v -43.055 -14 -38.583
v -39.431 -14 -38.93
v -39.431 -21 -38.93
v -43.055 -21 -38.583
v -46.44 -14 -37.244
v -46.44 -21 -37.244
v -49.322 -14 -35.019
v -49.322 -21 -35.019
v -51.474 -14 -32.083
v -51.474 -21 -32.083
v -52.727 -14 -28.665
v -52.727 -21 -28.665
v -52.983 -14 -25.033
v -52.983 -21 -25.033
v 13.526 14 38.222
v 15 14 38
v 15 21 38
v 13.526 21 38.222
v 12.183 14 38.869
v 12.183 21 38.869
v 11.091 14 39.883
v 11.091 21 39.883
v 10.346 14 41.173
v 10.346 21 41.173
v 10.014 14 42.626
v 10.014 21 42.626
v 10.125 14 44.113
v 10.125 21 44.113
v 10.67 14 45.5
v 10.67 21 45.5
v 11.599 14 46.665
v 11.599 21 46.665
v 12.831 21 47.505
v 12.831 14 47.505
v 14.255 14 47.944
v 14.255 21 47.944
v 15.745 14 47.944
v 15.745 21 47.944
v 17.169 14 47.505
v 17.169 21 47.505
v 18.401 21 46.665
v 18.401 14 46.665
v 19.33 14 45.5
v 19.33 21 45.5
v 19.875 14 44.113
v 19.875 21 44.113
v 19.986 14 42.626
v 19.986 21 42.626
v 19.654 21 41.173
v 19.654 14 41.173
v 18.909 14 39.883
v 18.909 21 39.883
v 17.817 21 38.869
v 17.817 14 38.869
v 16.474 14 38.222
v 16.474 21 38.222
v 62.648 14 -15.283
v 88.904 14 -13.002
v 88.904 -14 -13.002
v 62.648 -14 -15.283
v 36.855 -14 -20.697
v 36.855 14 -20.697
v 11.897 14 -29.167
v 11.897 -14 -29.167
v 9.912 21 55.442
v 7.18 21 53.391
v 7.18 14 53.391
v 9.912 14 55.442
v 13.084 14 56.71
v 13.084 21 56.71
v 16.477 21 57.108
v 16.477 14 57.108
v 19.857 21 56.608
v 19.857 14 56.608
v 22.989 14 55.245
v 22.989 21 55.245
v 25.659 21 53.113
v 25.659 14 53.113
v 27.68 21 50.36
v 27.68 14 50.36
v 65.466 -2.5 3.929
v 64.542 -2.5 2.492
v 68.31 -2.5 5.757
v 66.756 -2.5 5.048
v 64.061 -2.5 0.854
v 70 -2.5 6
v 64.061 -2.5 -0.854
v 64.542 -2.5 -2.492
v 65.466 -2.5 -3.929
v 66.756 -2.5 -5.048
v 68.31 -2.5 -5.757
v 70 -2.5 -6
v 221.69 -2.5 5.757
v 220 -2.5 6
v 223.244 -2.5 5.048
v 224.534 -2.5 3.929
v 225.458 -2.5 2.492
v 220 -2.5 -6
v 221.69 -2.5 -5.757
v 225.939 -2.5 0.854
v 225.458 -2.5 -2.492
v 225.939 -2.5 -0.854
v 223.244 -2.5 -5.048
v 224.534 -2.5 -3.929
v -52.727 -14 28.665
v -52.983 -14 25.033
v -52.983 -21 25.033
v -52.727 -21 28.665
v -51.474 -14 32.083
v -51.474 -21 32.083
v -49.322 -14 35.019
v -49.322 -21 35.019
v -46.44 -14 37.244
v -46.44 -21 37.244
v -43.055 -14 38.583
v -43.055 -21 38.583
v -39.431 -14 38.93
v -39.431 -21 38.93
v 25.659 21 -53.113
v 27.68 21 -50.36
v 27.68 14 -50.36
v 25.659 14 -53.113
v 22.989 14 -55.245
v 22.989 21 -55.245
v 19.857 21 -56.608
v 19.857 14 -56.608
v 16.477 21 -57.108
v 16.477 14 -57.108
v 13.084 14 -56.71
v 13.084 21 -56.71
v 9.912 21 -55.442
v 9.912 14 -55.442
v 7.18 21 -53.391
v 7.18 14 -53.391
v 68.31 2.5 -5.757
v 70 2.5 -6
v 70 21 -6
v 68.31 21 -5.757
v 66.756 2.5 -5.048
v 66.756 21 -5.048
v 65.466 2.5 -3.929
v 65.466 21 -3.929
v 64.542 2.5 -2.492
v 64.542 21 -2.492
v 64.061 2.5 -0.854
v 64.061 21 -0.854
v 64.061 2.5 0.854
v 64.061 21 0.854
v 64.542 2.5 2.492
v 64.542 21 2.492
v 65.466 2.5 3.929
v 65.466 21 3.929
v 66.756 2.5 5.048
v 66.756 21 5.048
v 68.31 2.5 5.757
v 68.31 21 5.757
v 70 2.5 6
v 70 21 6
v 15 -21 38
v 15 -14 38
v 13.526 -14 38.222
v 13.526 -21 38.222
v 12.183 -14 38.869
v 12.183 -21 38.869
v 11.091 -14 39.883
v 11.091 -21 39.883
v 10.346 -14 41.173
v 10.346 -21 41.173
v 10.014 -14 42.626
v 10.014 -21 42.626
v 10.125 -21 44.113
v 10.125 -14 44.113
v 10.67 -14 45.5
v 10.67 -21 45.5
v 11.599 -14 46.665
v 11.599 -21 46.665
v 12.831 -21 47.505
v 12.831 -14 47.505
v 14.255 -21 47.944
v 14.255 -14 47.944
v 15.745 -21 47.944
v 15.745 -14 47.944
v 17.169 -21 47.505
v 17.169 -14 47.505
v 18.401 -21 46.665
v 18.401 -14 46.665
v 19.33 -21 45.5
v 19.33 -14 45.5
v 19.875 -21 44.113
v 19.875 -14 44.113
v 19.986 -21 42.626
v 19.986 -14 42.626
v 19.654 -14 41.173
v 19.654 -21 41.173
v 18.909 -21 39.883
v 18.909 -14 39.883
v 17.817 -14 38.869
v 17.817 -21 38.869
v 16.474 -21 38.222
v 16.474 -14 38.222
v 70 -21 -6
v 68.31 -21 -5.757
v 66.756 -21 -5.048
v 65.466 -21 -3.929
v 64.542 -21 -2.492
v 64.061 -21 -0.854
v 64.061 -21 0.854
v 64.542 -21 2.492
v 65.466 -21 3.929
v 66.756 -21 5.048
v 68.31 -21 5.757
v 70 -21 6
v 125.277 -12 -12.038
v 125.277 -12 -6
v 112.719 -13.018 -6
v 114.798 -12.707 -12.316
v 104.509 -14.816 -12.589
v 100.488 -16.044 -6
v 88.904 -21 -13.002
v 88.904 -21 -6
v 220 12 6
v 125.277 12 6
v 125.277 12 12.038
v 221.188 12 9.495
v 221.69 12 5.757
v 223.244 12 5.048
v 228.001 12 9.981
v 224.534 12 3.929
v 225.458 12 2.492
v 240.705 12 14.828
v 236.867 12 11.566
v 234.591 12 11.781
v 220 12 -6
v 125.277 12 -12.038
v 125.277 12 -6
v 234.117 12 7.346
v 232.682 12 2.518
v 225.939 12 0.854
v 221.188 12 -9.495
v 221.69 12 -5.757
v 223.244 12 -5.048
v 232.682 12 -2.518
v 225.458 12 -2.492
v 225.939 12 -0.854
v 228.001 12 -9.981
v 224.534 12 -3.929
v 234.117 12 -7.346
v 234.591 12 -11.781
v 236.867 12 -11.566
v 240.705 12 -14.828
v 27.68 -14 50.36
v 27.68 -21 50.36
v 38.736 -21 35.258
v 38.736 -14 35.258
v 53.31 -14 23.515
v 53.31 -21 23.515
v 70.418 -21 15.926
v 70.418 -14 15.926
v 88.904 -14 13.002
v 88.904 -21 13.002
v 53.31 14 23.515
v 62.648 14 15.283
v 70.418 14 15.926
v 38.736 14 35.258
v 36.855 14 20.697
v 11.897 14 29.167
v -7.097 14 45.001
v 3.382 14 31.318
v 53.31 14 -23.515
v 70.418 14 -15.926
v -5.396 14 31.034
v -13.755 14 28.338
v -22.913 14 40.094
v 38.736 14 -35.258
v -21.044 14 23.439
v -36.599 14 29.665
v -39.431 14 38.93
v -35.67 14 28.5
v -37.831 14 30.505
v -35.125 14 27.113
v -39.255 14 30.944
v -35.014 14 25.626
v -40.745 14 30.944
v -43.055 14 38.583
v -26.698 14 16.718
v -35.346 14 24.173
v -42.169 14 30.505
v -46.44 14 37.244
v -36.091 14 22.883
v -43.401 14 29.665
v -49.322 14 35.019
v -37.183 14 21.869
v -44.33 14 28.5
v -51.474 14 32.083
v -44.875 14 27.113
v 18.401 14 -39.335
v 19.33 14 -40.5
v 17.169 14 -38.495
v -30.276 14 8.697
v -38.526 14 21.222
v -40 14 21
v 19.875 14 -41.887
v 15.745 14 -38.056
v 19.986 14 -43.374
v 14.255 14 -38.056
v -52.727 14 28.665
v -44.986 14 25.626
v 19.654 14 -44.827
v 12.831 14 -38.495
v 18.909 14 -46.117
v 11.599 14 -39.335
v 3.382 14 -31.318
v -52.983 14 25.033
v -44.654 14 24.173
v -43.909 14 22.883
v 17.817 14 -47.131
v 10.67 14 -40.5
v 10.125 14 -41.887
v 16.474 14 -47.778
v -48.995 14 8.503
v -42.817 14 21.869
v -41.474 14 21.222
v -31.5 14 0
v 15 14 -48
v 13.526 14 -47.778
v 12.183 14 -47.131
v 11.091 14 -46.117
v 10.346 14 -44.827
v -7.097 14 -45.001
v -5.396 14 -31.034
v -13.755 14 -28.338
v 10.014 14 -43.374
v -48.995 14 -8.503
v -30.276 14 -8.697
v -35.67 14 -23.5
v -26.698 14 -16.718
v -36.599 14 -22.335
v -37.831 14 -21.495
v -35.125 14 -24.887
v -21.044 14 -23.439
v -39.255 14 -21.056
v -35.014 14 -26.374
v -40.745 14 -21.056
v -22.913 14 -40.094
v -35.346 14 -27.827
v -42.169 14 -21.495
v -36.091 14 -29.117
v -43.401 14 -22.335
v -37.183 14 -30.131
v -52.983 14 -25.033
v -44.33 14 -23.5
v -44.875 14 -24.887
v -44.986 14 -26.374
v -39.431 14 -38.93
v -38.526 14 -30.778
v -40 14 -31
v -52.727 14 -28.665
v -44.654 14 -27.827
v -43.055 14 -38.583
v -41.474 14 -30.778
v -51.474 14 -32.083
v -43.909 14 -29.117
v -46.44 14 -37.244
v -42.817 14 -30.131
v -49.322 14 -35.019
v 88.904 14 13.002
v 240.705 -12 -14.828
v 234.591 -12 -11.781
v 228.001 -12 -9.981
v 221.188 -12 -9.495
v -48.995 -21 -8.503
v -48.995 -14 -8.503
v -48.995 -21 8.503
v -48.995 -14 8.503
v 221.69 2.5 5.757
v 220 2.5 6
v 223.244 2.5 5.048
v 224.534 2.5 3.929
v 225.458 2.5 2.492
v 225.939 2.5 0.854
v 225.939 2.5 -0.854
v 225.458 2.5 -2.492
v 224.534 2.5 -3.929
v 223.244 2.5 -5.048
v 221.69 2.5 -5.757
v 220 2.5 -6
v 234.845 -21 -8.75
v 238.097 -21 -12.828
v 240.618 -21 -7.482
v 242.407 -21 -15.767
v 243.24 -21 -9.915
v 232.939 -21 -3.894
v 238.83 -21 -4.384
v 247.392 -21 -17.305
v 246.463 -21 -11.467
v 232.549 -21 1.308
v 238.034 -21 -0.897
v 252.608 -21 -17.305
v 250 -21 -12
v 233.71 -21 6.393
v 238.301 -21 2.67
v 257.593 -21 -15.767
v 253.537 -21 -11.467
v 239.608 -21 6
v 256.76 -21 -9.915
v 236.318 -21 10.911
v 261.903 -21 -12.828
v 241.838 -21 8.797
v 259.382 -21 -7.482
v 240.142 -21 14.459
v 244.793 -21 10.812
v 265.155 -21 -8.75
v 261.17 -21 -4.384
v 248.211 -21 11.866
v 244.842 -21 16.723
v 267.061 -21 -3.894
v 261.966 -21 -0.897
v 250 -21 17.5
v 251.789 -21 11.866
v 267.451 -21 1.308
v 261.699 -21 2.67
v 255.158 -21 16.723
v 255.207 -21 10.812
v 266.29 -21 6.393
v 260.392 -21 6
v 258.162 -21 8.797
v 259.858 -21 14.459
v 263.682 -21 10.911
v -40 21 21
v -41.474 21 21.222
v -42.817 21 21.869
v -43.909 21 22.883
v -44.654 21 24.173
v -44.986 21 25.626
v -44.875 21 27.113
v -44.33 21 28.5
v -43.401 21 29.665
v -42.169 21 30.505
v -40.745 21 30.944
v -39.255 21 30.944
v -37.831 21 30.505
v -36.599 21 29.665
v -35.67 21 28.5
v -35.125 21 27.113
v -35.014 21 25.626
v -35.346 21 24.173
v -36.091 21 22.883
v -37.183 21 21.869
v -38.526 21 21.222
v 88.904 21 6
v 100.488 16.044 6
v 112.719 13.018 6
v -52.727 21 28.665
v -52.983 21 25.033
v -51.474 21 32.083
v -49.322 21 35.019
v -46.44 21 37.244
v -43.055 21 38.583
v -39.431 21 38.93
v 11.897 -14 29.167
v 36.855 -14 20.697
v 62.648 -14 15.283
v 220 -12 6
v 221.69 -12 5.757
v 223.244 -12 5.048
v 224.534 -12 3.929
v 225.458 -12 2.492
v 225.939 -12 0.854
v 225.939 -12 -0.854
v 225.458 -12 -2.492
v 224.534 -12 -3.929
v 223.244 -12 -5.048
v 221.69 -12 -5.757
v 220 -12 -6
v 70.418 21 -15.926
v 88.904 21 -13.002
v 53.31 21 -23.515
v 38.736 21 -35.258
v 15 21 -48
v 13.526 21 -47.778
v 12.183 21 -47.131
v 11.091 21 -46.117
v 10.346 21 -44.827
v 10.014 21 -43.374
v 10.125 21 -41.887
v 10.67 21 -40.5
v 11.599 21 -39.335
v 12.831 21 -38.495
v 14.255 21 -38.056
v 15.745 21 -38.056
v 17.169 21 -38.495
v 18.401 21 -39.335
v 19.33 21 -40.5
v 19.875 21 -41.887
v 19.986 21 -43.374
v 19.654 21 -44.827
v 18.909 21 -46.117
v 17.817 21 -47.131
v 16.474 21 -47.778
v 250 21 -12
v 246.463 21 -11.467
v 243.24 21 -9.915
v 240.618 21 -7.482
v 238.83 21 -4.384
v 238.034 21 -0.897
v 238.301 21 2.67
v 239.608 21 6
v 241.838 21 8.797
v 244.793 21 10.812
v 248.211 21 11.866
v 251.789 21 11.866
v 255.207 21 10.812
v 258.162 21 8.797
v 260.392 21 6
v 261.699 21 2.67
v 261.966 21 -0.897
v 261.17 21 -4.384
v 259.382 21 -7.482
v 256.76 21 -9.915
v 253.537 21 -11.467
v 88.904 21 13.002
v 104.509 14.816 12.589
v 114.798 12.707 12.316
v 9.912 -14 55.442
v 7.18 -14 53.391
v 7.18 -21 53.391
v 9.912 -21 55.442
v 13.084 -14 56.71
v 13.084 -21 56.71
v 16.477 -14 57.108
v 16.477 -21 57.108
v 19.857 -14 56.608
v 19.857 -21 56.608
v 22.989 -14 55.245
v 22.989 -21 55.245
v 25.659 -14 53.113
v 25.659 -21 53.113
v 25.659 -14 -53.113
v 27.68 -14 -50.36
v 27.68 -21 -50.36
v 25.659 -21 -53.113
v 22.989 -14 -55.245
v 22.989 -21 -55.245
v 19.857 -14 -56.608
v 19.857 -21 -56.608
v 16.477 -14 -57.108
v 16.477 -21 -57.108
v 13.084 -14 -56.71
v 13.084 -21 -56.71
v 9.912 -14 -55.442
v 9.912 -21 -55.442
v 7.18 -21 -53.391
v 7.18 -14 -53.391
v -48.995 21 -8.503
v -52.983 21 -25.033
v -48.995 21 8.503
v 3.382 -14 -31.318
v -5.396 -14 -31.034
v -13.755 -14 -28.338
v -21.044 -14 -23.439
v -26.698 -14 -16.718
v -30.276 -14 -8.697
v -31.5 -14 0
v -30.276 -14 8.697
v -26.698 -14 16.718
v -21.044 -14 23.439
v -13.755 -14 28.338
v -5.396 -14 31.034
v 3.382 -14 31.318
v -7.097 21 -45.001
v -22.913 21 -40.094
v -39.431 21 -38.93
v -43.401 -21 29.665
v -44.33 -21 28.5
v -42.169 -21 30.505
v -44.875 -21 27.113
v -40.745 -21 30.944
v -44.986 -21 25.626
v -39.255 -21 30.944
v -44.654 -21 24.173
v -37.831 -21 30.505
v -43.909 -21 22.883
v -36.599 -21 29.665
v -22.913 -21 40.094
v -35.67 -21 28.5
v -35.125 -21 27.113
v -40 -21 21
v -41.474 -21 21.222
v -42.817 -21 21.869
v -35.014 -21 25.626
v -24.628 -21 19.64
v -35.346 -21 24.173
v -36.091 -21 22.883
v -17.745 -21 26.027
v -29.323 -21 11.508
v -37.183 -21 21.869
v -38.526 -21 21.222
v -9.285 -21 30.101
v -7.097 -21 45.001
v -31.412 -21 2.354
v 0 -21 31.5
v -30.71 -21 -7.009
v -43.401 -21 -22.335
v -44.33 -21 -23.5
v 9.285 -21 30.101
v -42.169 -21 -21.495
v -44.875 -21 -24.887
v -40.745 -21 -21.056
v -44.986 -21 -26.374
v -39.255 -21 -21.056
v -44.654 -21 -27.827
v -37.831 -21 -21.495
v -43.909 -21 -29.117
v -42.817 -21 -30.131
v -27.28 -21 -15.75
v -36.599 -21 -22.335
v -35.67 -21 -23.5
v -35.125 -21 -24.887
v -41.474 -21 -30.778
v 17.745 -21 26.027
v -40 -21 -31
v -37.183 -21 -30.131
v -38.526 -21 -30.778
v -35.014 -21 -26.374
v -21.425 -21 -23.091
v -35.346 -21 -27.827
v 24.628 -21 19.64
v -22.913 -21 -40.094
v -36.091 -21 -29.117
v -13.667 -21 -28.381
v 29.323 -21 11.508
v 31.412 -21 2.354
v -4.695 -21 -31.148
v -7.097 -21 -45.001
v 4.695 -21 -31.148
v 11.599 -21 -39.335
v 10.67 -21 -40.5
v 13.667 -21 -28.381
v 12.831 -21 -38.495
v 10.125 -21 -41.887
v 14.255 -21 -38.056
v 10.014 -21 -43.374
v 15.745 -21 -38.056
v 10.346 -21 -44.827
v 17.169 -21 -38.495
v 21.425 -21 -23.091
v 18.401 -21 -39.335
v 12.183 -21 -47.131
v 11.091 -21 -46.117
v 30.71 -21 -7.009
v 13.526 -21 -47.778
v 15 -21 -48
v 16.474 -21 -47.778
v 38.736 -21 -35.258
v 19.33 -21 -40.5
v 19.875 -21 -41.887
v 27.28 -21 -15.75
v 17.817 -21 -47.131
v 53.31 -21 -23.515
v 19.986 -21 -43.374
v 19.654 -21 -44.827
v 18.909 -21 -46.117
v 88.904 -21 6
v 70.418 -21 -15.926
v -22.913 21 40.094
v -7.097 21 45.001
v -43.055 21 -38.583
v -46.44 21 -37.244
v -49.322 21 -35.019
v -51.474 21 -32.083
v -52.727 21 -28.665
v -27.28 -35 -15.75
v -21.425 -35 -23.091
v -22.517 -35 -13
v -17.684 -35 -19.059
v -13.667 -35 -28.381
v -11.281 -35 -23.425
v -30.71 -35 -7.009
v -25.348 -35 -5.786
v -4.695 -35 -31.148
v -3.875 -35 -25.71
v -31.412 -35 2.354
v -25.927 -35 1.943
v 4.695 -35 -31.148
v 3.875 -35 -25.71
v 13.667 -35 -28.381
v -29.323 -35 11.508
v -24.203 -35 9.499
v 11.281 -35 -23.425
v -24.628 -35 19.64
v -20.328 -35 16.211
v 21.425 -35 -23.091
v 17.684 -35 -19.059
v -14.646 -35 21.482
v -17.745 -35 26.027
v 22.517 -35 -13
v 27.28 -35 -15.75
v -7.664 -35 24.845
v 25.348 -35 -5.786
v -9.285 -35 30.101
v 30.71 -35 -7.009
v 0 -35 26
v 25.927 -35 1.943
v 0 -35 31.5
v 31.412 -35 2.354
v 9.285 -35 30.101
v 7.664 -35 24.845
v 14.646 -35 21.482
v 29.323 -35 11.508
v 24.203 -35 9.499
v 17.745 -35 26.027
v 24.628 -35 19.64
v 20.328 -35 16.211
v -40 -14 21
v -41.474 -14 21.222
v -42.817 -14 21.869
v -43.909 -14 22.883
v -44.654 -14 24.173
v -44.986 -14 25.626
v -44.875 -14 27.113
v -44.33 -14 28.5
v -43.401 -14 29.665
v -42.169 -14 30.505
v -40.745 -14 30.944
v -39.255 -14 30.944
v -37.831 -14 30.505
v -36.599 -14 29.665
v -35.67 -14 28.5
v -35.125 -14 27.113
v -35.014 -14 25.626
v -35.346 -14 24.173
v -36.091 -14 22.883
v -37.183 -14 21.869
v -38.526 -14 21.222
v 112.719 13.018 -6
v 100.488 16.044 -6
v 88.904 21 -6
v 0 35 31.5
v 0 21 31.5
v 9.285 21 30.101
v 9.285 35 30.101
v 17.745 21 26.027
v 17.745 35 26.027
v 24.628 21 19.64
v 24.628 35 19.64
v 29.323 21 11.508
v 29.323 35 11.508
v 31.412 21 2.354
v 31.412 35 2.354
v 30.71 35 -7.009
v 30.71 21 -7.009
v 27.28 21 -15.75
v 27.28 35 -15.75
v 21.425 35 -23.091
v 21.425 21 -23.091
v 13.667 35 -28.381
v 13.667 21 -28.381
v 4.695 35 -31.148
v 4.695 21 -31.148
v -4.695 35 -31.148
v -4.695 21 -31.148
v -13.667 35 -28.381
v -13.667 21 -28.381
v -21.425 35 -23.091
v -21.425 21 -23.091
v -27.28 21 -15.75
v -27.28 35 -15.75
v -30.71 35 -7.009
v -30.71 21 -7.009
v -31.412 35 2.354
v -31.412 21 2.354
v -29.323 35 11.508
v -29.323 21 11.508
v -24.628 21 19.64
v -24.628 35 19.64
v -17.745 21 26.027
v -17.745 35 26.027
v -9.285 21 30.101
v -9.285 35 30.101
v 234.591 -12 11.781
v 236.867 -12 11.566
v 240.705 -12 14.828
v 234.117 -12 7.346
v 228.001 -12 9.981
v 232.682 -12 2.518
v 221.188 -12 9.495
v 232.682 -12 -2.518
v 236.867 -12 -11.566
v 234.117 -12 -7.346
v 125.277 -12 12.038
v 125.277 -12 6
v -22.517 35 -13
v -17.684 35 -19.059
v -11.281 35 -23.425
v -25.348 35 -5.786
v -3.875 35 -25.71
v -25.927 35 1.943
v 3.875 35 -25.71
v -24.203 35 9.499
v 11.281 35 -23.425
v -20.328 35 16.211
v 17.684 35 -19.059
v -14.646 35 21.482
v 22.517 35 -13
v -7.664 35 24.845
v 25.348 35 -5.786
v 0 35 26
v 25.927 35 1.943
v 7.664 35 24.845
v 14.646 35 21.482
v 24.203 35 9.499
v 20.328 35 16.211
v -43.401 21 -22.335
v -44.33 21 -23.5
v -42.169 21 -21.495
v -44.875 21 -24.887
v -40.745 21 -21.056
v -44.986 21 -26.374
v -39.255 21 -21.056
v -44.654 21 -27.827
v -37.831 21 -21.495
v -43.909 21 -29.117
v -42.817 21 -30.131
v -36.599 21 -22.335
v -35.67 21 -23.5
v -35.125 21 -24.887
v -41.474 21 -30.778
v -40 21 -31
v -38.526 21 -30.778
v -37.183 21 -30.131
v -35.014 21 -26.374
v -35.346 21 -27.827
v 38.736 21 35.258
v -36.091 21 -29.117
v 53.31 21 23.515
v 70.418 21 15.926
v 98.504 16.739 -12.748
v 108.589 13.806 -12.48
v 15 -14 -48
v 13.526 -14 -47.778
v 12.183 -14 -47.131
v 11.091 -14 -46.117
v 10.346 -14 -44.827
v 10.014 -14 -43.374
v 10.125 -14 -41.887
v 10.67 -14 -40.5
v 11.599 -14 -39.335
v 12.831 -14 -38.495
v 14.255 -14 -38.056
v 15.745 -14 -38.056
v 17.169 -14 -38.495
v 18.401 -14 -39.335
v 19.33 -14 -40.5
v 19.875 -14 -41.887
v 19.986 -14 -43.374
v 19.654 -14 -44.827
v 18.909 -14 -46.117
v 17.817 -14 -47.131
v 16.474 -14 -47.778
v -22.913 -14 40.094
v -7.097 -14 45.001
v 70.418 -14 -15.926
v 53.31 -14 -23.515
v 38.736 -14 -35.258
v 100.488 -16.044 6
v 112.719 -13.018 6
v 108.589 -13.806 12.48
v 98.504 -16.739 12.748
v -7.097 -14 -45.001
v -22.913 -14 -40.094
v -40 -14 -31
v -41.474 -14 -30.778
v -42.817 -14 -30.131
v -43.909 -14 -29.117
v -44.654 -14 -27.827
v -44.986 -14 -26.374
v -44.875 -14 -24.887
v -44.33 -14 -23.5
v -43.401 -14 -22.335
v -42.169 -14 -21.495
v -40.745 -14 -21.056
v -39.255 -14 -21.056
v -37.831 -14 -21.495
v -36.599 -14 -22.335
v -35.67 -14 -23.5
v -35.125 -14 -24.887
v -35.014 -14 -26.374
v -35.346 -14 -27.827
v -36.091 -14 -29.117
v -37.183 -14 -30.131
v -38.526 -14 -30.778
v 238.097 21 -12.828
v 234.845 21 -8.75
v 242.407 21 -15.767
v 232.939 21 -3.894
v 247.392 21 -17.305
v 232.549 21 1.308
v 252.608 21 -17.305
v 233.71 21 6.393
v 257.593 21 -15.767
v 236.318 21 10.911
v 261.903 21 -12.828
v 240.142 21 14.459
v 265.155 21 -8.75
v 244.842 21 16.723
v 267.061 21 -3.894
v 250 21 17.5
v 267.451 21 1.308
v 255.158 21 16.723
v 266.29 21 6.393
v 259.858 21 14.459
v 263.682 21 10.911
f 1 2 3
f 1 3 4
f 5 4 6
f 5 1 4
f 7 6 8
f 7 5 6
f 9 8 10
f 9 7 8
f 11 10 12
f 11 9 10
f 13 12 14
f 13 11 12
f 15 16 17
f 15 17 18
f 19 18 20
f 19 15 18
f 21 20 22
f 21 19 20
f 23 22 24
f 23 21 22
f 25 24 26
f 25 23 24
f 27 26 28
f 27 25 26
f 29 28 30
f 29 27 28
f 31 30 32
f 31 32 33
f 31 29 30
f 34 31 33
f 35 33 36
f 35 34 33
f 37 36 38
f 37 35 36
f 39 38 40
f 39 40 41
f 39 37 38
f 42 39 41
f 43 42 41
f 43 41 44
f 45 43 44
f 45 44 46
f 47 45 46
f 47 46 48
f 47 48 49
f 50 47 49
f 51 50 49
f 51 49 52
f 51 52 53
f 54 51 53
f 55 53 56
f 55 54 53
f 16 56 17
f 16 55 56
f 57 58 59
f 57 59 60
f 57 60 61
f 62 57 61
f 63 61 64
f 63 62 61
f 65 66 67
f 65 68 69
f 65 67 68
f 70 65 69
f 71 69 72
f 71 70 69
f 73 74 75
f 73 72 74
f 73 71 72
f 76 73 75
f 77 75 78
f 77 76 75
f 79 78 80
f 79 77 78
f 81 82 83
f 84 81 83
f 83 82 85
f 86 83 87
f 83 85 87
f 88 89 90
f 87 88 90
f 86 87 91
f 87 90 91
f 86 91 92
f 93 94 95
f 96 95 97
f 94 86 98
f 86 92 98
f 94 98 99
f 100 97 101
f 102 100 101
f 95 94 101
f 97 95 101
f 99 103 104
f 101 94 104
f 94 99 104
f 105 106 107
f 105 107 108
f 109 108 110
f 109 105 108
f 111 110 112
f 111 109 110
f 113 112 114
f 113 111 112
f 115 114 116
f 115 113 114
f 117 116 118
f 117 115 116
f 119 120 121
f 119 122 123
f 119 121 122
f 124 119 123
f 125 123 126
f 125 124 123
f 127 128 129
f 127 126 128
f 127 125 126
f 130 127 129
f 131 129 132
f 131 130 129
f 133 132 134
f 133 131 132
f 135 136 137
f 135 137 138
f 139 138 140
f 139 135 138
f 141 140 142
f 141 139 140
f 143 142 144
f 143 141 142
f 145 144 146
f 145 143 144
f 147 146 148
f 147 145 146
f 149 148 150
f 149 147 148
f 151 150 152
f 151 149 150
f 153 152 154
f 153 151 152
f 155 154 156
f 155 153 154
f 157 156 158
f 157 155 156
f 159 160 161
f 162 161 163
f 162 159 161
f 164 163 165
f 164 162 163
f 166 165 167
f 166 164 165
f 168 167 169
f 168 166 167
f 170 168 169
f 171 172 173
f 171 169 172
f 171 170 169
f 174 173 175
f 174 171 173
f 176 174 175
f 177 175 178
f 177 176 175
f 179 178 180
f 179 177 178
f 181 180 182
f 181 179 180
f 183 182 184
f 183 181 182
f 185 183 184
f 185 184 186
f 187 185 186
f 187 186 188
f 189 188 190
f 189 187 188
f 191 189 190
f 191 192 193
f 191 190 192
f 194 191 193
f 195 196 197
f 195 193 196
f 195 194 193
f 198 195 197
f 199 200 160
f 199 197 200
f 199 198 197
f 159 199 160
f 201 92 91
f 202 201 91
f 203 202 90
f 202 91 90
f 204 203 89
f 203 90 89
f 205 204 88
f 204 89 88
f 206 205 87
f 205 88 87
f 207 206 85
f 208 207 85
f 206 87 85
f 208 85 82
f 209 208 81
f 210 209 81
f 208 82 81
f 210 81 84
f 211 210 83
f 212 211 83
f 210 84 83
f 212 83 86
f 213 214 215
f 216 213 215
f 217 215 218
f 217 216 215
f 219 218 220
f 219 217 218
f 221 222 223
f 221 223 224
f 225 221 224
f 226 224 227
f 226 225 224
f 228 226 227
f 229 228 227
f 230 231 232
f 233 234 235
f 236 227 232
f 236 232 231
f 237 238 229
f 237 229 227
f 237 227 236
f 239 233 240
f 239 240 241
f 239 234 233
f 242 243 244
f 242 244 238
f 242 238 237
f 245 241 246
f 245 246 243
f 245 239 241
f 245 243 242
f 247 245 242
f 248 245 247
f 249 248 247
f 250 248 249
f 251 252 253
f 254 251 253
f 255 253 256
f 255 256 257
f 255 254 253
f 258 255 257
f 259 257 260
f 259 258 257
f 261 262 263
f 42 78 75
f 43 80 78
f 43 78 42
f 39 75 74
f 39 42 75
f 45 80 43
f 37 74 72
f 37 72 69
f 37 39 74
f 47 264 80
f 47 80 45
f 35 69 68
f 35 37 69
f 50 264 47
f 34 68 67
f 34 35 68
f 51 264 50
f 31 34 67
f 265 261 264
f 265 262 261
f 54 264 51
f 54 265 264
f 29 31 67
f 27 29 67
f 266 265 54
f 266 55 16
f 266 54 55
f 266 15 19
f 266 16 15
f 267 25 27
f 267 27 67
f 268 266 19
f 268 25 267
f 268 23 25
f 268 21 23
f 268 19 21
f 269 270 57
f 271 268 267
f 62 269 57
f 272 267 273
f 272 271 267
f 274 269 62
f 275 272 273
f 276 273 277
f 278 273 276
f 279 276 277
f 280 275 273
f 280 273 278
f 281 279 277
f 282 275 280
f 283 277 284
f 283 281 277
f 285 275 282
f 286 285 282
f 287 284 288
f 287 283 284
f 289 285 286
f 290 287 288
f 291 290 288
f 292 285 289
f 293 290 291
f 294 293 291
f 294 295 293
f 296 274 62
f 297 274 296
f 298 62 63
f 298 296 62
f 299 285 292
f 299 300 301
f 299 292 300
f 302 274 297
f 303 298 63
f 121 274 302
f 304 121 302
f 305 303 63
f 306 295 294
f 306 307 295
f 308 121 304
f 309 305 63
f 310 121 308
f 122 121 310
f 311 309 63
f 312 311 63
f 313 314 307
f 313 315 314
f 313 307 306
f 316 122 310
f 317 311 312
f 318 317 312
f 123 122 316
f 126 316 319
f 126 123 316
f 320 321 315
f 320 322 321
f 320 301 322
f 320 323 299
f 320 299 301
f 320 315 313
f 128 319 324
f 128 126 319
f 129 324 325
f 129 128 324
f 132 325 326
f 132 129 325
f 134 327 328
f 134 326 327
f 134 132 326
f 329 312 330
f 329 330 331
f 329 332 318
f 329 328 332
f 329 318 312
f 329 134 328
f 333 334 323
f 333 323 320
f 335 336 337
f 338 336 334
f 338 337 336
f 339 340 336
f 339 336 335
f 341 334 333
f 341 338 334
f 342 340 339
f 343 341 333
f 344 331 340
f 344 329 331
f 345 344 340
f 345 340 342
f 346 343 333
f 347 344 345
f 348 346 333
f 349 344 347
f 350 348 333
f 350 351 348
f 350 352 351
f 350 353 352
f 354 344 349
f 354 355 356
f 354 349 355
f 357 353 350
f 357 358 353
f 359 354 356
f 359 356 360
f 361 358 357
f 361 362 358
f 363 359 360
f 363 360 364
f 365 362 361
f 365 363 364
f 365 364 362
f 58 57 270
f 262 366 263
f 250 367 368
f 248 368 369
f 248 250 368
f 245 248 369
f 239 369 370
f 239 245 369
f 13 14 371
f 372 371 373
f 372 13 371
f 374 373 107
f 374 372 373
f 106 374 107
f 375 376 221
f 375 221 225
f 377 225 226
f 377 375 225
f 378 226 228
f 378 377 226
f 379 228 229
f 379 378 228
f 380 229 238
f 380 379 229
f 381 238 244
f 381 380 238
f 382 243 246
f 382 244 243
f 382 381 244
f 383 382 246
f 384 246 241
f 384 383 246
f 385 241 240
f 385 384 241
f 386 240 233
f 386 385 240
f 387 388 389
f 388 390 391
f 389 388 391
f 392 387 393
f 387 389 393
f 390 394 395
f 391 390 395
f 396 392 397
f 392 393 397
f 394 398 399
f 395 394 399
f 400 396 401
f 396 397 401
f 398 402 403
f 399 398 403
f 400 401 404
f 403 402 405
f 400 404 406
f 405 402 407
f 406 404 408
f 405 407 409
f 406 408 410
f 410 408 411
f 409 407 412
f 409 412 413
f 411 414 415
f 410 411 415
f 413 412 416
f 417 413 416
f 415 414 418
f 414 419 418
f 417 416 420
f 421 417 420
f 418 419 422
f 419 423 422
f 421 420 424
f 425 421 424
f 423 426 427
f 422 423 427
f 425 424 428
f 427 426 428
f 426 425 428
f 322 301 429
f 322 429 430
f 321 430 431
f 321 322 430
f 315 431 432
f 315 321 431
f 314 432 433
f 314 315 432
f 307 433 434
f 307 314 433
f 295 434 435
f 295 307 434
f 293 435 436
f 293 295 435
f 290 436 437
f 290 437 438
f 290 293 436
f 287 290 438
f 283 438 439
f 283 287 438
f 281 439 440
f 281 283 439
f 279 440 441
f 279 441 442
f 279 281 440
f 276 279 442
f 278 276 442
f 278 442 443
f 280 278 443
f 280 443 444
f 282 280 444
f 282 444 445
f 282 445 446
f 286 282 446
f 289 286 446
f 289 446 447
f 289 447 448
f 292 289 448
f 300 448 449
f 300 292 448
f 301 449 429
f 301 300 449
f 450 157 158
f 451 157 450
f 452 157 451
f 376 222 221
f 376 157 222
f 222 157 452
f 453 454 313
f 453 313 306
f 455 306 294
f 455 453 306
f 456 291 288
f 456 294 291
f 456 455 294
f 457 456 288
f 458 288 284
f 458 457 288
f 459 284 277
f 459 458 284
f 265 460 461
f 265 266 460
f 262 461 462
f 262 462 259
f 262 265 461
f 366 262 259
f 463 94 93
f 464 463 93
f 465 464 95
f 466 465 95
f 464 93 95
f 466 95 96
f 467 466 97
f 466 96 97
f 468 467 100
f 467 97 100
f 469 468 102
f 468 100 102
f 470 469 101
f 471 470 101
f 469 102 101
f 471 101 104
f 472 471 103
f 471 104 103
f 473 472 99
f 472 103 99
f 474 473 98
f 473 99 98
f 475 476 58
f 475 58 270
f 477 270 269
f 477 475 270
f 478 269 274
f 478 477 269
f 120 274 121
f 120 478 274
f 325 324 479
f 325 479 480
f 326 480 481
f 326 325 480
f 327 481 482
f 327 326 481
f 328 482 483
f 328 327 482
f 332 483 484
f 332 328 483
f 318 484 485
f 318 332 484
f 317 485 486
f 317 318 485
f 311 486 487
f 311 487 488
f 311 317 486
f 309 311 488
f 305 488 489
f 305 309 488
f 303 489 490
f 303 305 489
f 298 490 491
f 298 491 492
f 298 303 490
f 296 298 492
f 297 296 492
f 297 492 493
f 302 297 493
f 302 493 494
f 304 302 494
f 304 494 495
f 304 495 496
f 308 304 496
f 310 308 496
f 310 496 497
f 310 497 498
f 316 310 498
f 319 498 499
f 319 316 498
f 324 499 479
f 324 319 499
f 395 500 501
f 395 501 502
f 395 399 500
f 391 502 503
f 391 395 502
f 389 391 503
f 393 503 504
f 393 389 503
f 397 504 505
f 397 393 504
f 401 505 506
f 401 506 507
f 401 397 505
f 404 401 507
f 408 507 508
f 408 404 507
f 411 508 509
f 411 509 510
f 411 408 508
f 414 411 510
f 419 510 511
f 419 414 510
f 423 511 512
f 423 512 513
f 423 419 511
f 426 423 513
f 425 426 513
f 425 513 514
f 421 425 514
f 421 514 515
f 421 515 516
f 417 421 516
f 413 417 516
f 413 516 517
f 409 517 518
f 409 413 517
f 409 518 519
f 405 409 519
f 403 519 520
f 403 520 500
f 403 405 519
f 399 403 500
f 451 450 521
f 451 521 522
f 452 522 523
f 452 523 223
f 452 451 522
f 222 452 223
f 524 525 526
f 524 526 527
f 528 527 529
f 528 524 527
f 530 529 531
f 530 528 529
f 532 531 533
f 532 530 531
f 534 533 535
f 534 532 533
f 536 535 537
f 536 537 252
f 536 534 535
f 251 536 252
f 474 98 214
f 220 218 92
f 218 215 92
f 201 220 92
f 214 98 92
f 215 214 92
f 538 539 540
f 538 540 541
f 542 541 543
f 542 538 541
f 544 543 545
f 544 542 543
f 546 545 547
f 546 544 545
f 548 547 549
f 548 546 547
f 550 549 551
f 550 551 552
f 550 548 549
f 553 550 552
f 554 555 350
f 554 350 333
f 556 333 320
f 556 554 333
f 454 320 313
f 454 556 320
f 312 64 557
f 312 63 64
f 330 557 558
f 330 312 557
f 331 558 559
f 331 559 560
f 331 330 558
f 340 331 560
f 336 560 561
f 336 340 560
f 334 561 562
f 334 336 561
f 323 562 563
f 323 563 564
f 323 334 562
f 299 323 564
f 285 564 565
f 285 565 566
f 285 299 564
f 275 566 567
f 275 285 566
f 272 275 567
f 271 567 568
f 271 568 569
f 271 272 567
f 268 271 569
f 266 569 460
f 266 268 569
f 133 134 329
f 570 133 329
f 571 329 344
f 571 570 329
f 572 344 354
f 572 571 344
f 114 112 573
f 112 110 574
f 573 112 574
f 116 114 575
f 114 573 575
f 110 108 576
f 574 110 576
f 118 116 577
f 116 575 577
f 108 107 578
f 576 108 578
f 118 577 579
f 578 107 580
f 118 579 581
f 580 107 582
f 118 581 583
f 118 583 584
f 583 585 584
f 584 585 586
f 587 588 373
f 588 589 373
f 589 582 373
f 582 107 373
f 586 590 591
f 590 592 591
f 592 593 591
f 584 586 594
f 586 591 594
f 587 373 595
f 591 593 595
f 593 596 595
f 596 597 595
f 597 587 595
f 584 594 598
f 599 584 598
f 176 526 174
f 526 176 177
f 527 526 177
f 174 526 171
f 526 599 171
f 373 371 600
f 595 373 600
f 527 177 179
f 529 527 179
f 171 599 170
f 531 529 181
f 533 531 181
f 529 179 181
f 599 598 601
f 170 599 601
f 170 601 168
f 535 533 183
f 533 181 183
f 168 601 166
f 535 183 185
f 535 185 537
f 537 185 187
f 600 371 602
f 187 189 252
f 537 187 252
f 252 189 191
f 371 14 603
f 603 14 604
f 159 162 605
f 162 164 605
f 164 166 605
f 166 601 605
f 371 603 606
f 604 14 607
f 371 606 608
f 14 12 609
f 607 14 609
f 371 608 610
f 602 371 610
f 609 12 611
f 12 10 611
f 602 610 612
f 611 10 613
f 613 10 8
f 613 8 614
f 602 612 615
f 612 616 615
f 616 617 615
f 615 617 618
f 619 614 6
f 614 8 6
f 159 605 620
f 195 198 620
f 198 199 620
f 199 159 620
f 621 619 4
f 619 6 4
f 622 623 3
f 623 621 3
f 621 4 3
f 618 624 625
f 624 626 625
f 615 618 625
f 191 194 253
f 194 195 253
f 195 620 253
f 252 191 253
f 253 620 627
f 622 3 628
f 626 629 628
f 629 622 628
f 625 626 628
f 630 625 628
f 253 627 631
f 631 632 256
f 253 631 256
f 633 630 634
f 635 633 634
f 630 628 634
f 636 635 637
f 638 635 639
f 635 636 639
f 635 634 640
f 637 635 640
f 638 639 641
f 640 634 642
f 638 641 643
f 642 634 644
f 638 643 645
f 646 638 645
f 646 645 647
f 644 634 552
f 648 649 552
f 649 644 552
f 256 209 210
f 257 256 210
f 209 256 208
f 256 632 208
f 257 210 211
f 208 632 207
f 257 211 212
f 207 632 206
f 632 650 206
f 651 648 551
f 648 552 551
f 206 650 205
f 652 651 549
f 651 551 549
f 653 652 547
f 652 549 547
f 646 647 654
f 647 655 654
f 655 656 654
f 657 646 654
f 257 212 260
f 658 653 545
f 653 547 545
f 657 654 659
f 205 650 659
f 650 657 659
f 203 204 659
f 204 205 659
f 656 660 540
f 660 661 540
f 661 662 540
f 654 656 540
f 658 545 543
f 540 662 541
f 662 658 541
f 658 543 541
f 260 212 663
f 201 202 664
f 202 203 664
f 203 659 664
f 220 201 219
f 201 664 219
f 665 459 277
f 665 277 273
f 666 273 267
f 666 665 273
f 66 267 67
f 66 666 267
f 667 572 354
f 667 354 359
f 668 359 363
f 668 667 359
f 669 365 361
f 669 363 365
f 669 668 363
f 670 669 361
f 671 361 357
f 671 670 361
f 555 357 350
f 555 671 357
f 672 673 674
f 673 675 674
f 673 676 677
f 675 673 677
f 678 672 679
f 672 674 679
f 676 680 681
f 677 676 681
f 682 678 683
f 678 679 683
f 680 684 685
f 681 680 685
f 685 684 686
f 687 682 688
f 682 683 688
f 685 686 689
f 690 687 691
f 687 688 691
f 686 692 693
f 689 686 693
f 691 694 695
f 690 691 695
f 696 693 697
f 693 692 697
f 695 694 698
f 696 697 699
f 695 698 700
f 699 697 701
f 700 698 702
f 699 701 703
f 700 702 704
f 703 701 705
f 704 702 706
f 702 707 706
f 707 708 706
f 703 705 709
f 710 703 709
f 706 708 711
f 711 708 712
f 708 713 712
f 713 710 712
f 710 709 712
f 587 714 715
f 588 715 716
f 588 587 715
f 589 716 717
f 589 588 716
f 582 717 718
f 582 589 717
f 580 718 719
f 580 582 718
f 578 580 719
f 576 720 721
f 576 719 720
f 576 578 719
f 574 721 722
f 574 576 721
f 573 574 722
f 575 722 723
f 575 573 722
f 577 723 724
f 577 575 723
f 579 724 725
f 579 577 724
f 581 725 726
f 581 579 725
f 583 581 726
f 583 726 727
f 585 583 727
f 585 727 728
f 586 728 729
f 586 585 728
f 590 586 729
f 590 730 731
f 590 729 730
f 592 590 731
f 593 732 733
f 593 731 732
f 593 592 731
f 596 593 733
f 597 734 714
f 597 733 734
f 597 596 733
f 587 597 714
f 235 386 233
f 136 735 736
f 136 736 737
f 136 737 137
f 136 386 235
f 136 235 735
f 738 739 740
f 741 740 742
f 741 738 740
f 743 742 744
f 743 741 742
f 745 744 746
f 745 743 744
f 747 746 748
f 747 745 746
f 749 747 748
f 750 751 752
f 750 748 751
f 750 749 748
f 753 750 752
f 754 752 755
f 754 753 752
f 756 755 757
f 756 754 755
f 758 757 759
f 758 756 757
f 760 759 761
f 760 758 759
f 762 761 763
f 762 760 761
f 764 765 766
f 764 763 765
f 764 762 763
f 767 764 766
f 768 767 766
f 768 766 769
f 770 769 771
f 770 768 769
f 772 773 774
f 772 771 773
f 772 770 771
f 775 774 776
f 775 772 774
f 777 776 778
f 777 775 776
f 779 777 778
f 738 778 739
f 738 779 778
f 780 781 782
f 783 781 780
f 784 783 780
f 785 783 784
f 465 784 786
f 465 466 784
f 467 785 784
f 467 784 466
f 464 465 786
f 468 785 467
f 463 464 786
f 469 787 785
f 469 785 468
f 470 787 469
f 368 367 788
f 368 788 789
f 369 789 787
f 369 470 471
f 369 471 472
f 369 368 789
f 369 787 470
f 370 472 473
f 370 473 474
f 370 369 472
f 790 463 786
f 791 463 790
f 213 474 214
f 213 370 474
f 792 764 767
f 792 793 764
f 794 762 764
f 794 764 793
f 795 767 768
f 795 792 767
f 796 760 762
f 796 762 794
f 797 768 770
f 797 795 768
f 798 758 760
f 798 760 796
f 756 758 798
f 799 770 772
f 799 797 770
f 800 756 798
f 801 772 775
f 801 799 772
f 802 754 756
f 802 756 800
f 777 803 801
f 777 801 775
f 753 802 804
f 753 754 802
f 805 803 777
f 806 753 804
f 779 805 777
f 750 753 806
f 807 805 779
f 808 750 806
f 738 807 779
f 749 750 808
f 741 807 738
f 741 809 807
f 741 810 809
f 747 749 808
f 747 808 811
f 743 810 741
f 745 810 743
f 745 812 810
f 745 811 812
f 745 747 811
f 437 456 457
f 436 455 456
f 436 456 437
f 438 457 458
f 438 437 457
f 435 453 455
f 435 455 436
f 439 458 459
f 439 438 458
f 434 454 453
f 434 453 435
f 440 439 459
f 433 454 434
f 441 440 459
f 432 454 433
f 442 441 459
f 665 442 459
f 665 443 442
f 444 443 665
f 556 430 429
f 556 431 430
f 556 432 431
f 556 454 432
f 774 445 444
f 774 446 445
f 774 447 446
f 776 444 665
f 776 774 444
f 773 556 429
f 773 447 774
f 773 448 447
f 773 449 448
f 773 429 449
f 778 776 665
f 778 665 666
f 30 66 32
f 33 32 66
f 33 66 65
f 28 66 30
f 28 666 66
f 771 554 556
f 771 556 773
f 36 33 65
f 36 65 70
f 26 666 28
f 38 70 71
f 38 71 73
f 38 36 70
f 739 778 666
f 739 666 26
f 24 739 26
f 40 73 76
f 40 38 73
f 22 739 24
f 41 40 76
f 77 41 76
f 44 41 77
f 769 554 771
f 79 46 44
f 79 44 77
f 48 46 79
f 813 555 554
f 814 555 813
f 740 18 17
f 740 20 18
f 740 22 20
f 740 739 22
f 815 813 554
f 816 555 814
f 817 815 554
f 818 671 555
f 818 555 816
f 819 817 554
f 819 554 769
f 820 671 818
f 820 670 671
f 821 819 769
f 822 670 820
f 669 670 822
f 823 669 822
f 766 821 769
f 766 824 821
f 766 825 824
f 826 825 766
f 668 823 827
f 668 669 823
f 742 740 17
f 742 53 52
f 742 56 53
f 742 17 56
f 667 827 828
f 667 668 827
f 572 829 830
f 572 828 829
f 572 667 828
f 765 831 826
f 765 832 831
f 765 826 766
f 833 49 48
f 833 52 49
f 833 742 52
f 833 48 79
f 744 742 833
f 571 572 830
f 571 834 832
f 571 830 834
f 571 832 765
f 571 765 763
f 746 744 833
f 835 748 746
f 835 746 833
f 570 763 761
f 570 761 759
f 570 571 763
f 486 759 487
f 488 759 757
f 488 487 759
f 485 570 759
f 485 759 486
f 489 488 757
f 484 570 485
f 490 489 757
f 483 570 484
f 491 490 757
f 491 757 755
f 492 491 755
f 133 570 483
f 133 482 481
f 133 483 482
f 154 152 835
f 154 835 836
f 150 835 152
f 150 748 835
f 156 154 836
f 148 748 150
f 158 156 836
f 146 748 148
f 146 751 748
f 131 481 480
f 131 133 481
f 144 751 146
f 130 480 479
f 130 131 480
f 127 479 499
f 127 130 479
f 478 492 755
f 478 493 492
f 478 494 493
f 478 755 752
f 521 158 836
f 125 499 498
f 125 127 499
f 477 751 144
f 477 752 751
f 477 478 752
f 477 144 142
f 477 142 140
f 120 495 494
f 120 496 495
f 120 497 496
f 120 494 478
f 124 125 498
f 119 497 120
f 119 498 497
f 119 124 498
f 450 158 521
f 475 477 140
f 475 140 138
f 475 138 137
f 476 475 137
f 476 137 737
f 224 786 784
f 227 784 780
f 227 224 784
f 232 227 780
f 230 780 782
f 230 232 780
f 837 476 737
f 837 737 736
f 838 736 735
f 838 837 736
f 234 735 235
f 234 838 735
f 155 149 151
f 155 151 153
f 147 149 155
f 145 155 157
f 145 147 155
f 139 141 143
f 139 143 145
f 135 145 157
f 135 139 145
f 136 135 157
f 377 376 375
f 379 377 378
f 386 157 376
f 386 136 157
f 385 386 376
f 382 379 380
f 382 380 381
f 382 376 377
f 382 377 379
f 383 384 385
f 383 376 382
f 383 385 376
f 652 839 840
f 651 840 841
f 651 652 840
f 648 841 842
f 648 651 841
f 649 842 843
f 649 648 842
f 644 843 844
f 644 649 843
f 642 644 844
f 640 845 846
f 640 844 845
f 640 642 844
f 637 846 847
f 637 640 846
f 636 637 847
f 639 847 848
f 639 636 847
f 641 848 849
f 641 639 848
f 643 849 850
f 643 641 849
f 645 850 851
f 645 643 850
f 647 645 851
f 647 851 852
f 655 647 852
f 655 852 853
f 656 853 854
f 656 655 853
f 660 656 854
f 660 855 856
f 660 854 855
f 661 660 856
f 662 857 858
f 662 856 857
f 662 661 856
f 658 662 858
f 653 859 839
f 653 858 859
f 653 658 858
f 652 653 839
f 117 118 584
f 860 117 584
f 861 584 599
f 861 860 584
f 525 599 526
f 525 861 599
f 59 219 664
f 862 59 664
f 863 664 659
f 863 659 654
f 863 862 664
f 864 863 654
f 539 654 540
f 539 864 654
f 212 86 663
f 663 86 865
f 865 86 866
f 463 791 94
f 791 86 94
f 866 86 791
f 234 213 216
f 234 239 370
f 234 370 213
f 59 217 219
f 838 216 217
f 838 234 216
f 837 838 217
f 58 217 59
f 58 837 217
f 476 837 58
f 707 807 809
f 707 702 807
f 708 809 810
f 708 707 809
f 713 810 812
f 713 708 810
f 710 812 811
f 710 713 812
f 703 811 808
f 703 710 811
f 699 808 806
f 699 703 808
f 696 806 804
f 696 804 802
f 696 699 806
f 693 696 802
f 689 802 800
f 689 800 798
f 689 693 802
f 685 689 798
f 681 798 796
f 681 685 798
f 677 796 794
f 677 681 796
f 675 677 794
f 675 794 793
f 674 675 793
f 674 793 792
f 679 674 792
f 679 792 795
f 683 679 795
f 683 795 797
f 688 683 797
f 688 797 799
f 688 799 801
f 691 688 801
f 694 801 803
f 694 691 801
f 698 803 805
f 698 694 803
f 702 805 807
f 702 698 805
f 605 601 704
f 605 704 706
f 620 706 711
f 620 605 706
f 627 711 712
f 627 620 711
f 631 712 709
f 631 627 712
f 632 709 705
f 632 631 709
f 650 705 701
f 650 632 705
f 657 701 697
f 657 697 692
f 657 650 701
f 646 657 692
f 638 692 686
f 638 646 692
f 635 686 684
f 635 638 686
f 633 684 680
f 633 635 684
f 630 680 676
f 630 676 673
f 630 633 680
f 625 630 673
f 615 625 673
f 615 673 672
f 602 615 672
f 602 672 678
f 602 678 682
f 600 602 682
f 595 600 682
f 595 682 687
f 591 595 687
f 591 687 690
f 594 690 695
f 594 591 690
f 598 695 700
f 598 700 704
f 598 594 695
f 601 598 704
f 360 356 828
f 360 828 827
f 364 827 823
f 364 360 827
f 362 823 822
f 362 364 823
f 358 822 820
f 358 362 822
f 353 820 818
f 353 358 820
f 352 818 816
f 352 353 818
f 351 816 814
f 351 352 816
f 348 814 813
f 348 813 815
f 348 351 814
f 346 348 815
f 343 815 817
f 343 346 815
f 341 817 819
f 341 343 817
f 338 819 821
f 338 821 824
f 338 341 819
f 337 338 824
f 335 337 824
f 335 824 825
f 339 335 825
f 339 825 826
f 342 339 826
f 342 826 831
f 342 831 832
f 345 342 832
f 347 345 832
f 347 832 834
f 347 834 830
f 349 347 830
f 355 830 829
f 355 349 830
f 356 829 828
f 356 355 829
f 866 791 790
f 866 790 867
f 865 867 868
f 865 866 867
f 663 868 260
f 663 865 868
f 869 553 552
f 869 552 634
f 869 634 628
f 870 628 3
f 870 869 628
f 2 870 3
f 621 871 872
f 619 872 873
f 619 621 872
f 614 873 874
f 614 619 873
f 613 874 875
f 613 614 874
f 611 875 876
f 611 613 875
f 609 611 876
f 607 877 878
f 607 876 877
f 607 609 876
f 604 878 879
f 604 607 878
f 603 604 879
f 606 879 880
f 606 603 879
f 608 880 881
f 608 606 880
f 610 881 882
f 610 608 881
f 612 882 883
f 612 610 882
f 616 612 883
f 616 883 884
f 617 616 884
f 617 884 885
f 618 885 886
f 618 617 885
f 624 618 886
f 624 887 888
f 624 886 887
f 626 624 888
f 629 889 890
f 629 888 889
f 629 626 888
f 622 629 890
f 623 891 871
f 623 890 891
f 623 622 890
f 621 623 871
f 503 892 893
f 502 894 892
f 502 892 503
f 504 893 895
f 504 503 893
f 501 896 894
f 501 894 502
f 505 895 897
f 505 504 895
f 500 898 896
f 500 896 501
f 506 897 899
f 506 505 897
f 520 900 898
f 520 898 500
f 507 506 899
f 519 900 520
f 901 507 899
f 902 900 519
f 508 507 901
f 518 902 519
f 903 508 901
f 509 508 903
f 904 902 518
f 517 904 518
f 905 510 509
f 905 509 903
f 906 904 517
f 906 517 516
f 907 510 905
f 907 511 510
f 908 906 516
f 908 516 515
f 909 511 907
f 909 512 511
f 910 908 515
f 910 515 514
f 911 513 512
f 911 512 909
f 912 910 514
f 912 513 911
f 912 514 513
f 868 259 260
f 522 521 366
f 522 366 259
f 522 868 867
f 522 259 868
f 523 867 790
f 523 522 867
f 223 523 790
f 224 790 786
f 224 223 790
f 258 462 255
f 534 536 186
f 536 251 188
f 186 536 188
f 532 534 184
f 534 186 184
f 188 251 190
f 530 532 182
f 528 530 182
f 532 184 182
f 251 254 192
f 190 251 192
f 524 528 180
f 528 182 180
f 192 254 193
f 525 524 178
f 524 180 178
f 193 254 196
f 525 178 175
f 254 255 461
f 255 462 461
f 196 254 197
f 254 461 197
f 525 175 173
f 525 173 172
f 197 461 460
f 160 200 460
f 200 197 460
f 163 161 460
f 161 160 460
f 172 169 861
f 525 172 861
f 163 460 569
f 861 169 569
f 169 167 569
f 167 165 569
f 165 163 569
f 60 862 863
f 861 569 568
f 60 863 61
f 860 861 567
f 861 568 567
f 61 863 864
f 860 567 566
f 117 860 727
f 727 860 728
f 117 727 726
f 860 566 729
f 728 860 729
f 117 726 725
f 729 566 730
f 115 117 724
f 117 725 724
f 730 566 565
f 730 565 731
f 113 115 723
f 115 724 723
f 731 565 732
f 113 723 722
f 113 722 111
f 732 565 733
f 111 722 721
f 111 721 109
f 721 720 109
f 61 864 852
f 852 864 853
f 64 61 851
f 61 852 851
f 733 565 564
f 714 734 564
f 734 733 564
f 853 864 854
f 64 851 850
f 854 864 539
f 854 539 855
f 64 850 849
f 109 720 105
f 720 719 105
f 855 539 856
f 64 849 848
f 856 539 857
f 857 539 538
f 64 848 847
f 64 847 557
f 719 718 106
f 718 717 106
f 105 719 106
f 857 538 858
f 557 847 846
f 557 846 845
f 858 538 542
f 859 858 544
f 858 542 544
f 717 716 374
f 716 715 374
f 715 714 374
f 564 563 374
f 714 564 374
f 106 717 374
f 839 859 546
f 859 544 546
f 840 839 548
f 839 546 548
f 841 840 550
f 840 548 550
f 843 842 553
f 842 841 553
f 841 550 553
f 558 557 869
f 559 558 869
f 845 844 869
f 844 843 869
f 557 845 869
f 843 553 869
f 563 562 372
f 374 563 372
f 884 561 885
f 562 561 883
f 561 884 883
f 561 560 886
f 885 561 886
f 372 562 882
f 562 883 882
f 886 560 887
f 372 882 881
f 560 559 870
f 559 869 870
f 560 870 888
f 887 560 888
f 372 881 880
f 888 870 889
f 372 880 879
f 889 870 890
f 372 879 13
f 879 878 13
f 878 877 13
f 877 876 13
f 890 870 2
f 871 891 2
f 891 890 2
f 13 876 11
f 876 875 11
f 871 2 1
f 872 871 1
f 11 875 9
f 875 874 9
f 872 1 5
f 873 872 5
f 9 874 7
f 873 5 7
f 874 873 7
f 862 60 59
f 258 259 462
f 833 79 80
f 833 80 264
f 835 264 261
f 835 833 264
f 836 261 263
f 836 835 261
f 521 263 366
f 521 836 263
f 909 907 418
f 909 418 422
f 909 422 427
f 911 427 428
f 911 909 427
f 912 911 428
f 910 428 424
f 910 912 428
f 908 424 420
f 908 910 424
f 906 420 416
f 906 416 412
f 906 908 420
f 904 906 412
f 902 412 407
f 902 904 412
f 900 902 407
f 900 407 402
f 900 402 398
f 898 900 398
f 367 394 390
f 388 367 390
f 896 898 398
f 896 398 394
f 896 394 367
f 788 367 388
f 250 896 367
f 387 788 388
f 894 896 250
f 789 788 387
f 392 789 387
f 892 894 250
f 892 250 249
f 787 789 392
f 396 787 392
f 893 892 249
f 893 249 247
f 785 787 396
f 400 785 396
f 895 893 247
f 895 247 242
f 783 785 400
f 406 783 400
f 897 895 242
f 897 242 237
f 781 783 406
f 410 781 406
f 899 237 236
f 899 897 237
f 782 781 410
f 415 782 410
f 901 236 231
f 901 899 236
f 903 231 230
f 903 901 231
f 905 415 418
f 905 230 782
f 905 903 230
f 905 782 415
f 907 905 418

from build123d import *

# Parameters (mm, degrees)
SKETCH1_R               = 5
SKETCH1_R_2             = 31.5
BOSS_EXTRUDE1_DEPTH     = 21
CUT_EXTRUDE1_DEPTH      = 249.276960573
CUT_EXTRUDE1_DEPTH_BACK = 249.276960573
SKETCH1_3_R             = 12
BOSS_EXTRUDE2_DEPTH     = 21
SKETCH1_4_R             = 31.5
SKETCH1_4_R_2           = 26
BOSS_EXTRUDE3_DEPTH     = 35
CUT_EXTRUDE2_START      = 2.5
CUT_EXTRUDE2_DEPTH      = 70
CUT_EXTRUDE3_DEPTH      = 14


with BuildPart() as part:
    # Sketch1 → Boss-Extrude1 (new, symmetric)
    with BuildSketch(Plane(origin=(0, 0, 0), x_dir=(1, 0, 0), z_dir=(0, 1, 0))):
        with BuildLine():
            Line((221.187786225, 9.494895459), (88.904140781, 13.002249852))
            ThreePointArc((88.904140781, 13.002249852), (53.309733953, 23.515221578), (27.680495601, 50.35970916))
            ThreePointArc((27.680495601, 50.35970916), (18.1834351, 56.969515961), (7.179772337, 53.391372602))
            ThreePointArc((7.179772337, 53.391372602), (-14.863061383, 42.091119402), (-39.431134928, 38.930106423))
            ThreePointArc((-39.431134928, 38.930106423), (-49.321982863, 35.019426592), (-52.982993526, 25.033471929))
            ThreePointArc((-52.982993526, 25.033471929), (-48.490958117, 0), (-52.982993526, -25.033471929))
            ThreePointArc((-52.982993526, -25.033471929), (-49.321982863, -35.019426592), (-39.431134928, -38.930106423))
            ThreePointArc((-39.431134928, -38.930106423), (-14.863061383, -42.091119402), (7.179772337, -53.391372602))
            ThreePointArc((7.179772337, -53.391372602), (18.1834351, -56.969515961), (27.680495601, -50.35970916))
            ThreePointArc((27.680495601, -50.35970916), (53.309733953, -23.515221578), (88.904140781, -13.002249852))
            Line((88.904140781, -13.002249852), (221.187786225, -9.494895459))
            ThreePointArc((221.187786225, -9.494895459), (231.340206045, -10.720138116), (240.705148821, -14.827533226))
            ThreePointArc((240.705148821, -14.827533226), (232.5, 0), (240.705148821, 14.827533226))
            ThreePointArc((240.705148821, 14.827533226), (231.340206045, 10.720138116), (221.187786225, 9.494895459))
        make_face()
        with Locations((15, -43)):
            Circle(SKETCH1_R, mode=Mode.SUBTRACT)
        with Locations((-40, -26)):
            Circle(SKETCH1_R, mode=Mode.SUBTRACT)
        Circle(SKETCH1_R_2, mode=Mode.SUBTRACT)
        with Locations((-40, 26)):
            Circle(SKETCH1_R, mode=Mode.SUBTRACT)
        with Locations((15, 43)):
            Circle(SKETCH1_R, mode=Mode.SUBTRACT)
    extrude(amount=BOSS_EXTRUDE1_DEPTH, both=True)

    # Sketch2 → Cut-Extrude1 (cut, two sides: drawn at the far end of the back side and taken through both)
    with BuildSketch(Plane.XY.offset(-CUT_EXTRUDE1_DEPTH_BACK)):
        with BuildLine():
            Line((240.705148821, 21), (221.187786225, 21))
            Line((221.187786225, 21), (88.904140781, 21))
            ThreePointArc((88.904140781, 21), (106.542213745, 14.283423215), (125.27720774, 12))
            Line((125.27720774, 12), (240.705148821, 12))
            Line((240.705148821, 12), (240.705148821, 21))
        make_face()
        with BuildLine():
            Line((240.705148821, -12), (125.27720774, -12))
            ThreePointArc((125.27720774, -12), (106.542213745, -14.283423215), (88.904140781, -21))
            Line((88.904140781, -21), (221.187786225, -21))
            Line((221.187786225, -21), (240.705148821, -21))
            Line((240.705148821, -21), (240.705148821, -12))
        make_face()
    extrude(amount=CUT_EXTRUDE1_DEPTH + CUT_EXTRUDE1_DEPTH_BACK, mode=Mode.SUBTRACT)

    # Sketch1<3> → Boss-Extrude2 (add, symmetric)
    with BuildSketch(Plane(origin=(0, 0, 0), x_dir=(1, 0, 0), z_dir=(0, 1, 0))):
        with BuildLine():
            ThreePointArc((267.5, 0), (258.473196102, 15.311921754), (240.705148821, 14.827533226))
            ThreePointArc((240.705148821, 14.827533226), (232.5, 0), (240.705148821, -14.827533226))
            ThreePointArc((240.705148821, -14.827533226), (258.473196102, -15.311921754), (267.5, 0))
        make_face()
        with Locations((250, 0)):
            Circle(SKETCH1_3_R, mode=Mode.SUBTRACT)
    extrude(amount=BOSS_EXTRUDE2_DEPTH, both=True)

    # Sketch1<4> → Boss-Extrude3 (add, symmetric)
    with BuildSketch(Plane(origin=(0, 0, 0), x_dir=(1, 0, 0), z_dir=(0, 1, 0))):
        Circle(SKETCH1_4_R)
        Circle(SKETCH1_4_R_2, mode=Mode.SUBTRACT)
    extrude(amount=BOSS_EXTRUDE3_DEPTH, both=True)

    # Sketch1<5> → Cut-Extrude2 (cut)
    with BuildSketch(Plane(origin=(0, 0, 0), x_dir=(1, 0, 0), z_dir=(0, 1, 0)).offset(CUT_EXTRUDE2_START)):
        with BuildLine():
            Line((220, 6), (70, 6))
            ThreePointArc((70, 6), (64, 0), (70, -6))
            Line((70, -6), (220, -6))
            ThreePointArc((220, -6), (226, 0), (220, 6))
        make_face()
    cut_extrude2 = extrude(amount=CUT_EXTRUDE2_DEPTH, mode=Mode.SUBTRACT)

    # Mirror1: Cut-Extrude2 across plane
    add(cut_extrude2.mirror(Plane.ZX), mode=Mode.SUBTRACT)

    # Sketch5 → Cut-Extrude3 (cut, symmetric)
    with BuildSketch(Plane(origin=(0, 0, 0), x_dir=(1, 0, 0), z_dir=(0, 1, 0))):
        with BuildLine():
            ThreePointArc((88.904140781, 13.002249852), (49.66976816, 17.602087151), (11.897396977, 29.16679525))
            ThreePointArc((11.897396977, 29.16679525), (-31.5, 0), (11.897396977, -29.16679525))
            ThreePointArc((11.897396977, -29.16679525), (49.66976816, -17.602087151), (88.904140781, -13.002249852))
            ThreePointArc((88.904140781, -13.002249852), (53.309733953, -23.515221578), (27.680495601, -50.35970916))
            ThreePointArc((27.680495601, -50.35970916), (18.1834351, -56.969515961), (7.179772337, -53.391372602))
            ThreePointArc((7.179772337, -53.391372602), (-14.863061383, -42.091119402), (-39.431134928, -38.930106423))
            ThreePointArc((-39.431134928, -38.930106423), (-49.321982863, -35.019426592), (-52.982993526, -25.033471929))
            ThreePointArc((-52.982993526, -25.033471929), (-48.490958117, 0), (-52.982993526, 25.033471929))
            ThreePointArc((-52.982993526, 25.033471929), (-49.321982863, 35.019426592), (-39.431134928, 38.930106423))
            ThreePointArc((-39.431134928, 38.930106423), (-14.863061383, 42.091119402), (7.179772337, 53.391372602))
            ThreePointArc((7.179772337, 53.391372602), (18.1834351, 56.969515961), (27.680495601, 50.35970916))
            ThreePointArc((27.680495601, 50.35970916), (53.309733953, 23.515221578), (88.904140781, 13.002249852))
        make_face()
    extrude(amount=CUT_EXTRUDE3_DEPTH, both=True, mode=Mode.SUBTRACT)


solid = part.part
